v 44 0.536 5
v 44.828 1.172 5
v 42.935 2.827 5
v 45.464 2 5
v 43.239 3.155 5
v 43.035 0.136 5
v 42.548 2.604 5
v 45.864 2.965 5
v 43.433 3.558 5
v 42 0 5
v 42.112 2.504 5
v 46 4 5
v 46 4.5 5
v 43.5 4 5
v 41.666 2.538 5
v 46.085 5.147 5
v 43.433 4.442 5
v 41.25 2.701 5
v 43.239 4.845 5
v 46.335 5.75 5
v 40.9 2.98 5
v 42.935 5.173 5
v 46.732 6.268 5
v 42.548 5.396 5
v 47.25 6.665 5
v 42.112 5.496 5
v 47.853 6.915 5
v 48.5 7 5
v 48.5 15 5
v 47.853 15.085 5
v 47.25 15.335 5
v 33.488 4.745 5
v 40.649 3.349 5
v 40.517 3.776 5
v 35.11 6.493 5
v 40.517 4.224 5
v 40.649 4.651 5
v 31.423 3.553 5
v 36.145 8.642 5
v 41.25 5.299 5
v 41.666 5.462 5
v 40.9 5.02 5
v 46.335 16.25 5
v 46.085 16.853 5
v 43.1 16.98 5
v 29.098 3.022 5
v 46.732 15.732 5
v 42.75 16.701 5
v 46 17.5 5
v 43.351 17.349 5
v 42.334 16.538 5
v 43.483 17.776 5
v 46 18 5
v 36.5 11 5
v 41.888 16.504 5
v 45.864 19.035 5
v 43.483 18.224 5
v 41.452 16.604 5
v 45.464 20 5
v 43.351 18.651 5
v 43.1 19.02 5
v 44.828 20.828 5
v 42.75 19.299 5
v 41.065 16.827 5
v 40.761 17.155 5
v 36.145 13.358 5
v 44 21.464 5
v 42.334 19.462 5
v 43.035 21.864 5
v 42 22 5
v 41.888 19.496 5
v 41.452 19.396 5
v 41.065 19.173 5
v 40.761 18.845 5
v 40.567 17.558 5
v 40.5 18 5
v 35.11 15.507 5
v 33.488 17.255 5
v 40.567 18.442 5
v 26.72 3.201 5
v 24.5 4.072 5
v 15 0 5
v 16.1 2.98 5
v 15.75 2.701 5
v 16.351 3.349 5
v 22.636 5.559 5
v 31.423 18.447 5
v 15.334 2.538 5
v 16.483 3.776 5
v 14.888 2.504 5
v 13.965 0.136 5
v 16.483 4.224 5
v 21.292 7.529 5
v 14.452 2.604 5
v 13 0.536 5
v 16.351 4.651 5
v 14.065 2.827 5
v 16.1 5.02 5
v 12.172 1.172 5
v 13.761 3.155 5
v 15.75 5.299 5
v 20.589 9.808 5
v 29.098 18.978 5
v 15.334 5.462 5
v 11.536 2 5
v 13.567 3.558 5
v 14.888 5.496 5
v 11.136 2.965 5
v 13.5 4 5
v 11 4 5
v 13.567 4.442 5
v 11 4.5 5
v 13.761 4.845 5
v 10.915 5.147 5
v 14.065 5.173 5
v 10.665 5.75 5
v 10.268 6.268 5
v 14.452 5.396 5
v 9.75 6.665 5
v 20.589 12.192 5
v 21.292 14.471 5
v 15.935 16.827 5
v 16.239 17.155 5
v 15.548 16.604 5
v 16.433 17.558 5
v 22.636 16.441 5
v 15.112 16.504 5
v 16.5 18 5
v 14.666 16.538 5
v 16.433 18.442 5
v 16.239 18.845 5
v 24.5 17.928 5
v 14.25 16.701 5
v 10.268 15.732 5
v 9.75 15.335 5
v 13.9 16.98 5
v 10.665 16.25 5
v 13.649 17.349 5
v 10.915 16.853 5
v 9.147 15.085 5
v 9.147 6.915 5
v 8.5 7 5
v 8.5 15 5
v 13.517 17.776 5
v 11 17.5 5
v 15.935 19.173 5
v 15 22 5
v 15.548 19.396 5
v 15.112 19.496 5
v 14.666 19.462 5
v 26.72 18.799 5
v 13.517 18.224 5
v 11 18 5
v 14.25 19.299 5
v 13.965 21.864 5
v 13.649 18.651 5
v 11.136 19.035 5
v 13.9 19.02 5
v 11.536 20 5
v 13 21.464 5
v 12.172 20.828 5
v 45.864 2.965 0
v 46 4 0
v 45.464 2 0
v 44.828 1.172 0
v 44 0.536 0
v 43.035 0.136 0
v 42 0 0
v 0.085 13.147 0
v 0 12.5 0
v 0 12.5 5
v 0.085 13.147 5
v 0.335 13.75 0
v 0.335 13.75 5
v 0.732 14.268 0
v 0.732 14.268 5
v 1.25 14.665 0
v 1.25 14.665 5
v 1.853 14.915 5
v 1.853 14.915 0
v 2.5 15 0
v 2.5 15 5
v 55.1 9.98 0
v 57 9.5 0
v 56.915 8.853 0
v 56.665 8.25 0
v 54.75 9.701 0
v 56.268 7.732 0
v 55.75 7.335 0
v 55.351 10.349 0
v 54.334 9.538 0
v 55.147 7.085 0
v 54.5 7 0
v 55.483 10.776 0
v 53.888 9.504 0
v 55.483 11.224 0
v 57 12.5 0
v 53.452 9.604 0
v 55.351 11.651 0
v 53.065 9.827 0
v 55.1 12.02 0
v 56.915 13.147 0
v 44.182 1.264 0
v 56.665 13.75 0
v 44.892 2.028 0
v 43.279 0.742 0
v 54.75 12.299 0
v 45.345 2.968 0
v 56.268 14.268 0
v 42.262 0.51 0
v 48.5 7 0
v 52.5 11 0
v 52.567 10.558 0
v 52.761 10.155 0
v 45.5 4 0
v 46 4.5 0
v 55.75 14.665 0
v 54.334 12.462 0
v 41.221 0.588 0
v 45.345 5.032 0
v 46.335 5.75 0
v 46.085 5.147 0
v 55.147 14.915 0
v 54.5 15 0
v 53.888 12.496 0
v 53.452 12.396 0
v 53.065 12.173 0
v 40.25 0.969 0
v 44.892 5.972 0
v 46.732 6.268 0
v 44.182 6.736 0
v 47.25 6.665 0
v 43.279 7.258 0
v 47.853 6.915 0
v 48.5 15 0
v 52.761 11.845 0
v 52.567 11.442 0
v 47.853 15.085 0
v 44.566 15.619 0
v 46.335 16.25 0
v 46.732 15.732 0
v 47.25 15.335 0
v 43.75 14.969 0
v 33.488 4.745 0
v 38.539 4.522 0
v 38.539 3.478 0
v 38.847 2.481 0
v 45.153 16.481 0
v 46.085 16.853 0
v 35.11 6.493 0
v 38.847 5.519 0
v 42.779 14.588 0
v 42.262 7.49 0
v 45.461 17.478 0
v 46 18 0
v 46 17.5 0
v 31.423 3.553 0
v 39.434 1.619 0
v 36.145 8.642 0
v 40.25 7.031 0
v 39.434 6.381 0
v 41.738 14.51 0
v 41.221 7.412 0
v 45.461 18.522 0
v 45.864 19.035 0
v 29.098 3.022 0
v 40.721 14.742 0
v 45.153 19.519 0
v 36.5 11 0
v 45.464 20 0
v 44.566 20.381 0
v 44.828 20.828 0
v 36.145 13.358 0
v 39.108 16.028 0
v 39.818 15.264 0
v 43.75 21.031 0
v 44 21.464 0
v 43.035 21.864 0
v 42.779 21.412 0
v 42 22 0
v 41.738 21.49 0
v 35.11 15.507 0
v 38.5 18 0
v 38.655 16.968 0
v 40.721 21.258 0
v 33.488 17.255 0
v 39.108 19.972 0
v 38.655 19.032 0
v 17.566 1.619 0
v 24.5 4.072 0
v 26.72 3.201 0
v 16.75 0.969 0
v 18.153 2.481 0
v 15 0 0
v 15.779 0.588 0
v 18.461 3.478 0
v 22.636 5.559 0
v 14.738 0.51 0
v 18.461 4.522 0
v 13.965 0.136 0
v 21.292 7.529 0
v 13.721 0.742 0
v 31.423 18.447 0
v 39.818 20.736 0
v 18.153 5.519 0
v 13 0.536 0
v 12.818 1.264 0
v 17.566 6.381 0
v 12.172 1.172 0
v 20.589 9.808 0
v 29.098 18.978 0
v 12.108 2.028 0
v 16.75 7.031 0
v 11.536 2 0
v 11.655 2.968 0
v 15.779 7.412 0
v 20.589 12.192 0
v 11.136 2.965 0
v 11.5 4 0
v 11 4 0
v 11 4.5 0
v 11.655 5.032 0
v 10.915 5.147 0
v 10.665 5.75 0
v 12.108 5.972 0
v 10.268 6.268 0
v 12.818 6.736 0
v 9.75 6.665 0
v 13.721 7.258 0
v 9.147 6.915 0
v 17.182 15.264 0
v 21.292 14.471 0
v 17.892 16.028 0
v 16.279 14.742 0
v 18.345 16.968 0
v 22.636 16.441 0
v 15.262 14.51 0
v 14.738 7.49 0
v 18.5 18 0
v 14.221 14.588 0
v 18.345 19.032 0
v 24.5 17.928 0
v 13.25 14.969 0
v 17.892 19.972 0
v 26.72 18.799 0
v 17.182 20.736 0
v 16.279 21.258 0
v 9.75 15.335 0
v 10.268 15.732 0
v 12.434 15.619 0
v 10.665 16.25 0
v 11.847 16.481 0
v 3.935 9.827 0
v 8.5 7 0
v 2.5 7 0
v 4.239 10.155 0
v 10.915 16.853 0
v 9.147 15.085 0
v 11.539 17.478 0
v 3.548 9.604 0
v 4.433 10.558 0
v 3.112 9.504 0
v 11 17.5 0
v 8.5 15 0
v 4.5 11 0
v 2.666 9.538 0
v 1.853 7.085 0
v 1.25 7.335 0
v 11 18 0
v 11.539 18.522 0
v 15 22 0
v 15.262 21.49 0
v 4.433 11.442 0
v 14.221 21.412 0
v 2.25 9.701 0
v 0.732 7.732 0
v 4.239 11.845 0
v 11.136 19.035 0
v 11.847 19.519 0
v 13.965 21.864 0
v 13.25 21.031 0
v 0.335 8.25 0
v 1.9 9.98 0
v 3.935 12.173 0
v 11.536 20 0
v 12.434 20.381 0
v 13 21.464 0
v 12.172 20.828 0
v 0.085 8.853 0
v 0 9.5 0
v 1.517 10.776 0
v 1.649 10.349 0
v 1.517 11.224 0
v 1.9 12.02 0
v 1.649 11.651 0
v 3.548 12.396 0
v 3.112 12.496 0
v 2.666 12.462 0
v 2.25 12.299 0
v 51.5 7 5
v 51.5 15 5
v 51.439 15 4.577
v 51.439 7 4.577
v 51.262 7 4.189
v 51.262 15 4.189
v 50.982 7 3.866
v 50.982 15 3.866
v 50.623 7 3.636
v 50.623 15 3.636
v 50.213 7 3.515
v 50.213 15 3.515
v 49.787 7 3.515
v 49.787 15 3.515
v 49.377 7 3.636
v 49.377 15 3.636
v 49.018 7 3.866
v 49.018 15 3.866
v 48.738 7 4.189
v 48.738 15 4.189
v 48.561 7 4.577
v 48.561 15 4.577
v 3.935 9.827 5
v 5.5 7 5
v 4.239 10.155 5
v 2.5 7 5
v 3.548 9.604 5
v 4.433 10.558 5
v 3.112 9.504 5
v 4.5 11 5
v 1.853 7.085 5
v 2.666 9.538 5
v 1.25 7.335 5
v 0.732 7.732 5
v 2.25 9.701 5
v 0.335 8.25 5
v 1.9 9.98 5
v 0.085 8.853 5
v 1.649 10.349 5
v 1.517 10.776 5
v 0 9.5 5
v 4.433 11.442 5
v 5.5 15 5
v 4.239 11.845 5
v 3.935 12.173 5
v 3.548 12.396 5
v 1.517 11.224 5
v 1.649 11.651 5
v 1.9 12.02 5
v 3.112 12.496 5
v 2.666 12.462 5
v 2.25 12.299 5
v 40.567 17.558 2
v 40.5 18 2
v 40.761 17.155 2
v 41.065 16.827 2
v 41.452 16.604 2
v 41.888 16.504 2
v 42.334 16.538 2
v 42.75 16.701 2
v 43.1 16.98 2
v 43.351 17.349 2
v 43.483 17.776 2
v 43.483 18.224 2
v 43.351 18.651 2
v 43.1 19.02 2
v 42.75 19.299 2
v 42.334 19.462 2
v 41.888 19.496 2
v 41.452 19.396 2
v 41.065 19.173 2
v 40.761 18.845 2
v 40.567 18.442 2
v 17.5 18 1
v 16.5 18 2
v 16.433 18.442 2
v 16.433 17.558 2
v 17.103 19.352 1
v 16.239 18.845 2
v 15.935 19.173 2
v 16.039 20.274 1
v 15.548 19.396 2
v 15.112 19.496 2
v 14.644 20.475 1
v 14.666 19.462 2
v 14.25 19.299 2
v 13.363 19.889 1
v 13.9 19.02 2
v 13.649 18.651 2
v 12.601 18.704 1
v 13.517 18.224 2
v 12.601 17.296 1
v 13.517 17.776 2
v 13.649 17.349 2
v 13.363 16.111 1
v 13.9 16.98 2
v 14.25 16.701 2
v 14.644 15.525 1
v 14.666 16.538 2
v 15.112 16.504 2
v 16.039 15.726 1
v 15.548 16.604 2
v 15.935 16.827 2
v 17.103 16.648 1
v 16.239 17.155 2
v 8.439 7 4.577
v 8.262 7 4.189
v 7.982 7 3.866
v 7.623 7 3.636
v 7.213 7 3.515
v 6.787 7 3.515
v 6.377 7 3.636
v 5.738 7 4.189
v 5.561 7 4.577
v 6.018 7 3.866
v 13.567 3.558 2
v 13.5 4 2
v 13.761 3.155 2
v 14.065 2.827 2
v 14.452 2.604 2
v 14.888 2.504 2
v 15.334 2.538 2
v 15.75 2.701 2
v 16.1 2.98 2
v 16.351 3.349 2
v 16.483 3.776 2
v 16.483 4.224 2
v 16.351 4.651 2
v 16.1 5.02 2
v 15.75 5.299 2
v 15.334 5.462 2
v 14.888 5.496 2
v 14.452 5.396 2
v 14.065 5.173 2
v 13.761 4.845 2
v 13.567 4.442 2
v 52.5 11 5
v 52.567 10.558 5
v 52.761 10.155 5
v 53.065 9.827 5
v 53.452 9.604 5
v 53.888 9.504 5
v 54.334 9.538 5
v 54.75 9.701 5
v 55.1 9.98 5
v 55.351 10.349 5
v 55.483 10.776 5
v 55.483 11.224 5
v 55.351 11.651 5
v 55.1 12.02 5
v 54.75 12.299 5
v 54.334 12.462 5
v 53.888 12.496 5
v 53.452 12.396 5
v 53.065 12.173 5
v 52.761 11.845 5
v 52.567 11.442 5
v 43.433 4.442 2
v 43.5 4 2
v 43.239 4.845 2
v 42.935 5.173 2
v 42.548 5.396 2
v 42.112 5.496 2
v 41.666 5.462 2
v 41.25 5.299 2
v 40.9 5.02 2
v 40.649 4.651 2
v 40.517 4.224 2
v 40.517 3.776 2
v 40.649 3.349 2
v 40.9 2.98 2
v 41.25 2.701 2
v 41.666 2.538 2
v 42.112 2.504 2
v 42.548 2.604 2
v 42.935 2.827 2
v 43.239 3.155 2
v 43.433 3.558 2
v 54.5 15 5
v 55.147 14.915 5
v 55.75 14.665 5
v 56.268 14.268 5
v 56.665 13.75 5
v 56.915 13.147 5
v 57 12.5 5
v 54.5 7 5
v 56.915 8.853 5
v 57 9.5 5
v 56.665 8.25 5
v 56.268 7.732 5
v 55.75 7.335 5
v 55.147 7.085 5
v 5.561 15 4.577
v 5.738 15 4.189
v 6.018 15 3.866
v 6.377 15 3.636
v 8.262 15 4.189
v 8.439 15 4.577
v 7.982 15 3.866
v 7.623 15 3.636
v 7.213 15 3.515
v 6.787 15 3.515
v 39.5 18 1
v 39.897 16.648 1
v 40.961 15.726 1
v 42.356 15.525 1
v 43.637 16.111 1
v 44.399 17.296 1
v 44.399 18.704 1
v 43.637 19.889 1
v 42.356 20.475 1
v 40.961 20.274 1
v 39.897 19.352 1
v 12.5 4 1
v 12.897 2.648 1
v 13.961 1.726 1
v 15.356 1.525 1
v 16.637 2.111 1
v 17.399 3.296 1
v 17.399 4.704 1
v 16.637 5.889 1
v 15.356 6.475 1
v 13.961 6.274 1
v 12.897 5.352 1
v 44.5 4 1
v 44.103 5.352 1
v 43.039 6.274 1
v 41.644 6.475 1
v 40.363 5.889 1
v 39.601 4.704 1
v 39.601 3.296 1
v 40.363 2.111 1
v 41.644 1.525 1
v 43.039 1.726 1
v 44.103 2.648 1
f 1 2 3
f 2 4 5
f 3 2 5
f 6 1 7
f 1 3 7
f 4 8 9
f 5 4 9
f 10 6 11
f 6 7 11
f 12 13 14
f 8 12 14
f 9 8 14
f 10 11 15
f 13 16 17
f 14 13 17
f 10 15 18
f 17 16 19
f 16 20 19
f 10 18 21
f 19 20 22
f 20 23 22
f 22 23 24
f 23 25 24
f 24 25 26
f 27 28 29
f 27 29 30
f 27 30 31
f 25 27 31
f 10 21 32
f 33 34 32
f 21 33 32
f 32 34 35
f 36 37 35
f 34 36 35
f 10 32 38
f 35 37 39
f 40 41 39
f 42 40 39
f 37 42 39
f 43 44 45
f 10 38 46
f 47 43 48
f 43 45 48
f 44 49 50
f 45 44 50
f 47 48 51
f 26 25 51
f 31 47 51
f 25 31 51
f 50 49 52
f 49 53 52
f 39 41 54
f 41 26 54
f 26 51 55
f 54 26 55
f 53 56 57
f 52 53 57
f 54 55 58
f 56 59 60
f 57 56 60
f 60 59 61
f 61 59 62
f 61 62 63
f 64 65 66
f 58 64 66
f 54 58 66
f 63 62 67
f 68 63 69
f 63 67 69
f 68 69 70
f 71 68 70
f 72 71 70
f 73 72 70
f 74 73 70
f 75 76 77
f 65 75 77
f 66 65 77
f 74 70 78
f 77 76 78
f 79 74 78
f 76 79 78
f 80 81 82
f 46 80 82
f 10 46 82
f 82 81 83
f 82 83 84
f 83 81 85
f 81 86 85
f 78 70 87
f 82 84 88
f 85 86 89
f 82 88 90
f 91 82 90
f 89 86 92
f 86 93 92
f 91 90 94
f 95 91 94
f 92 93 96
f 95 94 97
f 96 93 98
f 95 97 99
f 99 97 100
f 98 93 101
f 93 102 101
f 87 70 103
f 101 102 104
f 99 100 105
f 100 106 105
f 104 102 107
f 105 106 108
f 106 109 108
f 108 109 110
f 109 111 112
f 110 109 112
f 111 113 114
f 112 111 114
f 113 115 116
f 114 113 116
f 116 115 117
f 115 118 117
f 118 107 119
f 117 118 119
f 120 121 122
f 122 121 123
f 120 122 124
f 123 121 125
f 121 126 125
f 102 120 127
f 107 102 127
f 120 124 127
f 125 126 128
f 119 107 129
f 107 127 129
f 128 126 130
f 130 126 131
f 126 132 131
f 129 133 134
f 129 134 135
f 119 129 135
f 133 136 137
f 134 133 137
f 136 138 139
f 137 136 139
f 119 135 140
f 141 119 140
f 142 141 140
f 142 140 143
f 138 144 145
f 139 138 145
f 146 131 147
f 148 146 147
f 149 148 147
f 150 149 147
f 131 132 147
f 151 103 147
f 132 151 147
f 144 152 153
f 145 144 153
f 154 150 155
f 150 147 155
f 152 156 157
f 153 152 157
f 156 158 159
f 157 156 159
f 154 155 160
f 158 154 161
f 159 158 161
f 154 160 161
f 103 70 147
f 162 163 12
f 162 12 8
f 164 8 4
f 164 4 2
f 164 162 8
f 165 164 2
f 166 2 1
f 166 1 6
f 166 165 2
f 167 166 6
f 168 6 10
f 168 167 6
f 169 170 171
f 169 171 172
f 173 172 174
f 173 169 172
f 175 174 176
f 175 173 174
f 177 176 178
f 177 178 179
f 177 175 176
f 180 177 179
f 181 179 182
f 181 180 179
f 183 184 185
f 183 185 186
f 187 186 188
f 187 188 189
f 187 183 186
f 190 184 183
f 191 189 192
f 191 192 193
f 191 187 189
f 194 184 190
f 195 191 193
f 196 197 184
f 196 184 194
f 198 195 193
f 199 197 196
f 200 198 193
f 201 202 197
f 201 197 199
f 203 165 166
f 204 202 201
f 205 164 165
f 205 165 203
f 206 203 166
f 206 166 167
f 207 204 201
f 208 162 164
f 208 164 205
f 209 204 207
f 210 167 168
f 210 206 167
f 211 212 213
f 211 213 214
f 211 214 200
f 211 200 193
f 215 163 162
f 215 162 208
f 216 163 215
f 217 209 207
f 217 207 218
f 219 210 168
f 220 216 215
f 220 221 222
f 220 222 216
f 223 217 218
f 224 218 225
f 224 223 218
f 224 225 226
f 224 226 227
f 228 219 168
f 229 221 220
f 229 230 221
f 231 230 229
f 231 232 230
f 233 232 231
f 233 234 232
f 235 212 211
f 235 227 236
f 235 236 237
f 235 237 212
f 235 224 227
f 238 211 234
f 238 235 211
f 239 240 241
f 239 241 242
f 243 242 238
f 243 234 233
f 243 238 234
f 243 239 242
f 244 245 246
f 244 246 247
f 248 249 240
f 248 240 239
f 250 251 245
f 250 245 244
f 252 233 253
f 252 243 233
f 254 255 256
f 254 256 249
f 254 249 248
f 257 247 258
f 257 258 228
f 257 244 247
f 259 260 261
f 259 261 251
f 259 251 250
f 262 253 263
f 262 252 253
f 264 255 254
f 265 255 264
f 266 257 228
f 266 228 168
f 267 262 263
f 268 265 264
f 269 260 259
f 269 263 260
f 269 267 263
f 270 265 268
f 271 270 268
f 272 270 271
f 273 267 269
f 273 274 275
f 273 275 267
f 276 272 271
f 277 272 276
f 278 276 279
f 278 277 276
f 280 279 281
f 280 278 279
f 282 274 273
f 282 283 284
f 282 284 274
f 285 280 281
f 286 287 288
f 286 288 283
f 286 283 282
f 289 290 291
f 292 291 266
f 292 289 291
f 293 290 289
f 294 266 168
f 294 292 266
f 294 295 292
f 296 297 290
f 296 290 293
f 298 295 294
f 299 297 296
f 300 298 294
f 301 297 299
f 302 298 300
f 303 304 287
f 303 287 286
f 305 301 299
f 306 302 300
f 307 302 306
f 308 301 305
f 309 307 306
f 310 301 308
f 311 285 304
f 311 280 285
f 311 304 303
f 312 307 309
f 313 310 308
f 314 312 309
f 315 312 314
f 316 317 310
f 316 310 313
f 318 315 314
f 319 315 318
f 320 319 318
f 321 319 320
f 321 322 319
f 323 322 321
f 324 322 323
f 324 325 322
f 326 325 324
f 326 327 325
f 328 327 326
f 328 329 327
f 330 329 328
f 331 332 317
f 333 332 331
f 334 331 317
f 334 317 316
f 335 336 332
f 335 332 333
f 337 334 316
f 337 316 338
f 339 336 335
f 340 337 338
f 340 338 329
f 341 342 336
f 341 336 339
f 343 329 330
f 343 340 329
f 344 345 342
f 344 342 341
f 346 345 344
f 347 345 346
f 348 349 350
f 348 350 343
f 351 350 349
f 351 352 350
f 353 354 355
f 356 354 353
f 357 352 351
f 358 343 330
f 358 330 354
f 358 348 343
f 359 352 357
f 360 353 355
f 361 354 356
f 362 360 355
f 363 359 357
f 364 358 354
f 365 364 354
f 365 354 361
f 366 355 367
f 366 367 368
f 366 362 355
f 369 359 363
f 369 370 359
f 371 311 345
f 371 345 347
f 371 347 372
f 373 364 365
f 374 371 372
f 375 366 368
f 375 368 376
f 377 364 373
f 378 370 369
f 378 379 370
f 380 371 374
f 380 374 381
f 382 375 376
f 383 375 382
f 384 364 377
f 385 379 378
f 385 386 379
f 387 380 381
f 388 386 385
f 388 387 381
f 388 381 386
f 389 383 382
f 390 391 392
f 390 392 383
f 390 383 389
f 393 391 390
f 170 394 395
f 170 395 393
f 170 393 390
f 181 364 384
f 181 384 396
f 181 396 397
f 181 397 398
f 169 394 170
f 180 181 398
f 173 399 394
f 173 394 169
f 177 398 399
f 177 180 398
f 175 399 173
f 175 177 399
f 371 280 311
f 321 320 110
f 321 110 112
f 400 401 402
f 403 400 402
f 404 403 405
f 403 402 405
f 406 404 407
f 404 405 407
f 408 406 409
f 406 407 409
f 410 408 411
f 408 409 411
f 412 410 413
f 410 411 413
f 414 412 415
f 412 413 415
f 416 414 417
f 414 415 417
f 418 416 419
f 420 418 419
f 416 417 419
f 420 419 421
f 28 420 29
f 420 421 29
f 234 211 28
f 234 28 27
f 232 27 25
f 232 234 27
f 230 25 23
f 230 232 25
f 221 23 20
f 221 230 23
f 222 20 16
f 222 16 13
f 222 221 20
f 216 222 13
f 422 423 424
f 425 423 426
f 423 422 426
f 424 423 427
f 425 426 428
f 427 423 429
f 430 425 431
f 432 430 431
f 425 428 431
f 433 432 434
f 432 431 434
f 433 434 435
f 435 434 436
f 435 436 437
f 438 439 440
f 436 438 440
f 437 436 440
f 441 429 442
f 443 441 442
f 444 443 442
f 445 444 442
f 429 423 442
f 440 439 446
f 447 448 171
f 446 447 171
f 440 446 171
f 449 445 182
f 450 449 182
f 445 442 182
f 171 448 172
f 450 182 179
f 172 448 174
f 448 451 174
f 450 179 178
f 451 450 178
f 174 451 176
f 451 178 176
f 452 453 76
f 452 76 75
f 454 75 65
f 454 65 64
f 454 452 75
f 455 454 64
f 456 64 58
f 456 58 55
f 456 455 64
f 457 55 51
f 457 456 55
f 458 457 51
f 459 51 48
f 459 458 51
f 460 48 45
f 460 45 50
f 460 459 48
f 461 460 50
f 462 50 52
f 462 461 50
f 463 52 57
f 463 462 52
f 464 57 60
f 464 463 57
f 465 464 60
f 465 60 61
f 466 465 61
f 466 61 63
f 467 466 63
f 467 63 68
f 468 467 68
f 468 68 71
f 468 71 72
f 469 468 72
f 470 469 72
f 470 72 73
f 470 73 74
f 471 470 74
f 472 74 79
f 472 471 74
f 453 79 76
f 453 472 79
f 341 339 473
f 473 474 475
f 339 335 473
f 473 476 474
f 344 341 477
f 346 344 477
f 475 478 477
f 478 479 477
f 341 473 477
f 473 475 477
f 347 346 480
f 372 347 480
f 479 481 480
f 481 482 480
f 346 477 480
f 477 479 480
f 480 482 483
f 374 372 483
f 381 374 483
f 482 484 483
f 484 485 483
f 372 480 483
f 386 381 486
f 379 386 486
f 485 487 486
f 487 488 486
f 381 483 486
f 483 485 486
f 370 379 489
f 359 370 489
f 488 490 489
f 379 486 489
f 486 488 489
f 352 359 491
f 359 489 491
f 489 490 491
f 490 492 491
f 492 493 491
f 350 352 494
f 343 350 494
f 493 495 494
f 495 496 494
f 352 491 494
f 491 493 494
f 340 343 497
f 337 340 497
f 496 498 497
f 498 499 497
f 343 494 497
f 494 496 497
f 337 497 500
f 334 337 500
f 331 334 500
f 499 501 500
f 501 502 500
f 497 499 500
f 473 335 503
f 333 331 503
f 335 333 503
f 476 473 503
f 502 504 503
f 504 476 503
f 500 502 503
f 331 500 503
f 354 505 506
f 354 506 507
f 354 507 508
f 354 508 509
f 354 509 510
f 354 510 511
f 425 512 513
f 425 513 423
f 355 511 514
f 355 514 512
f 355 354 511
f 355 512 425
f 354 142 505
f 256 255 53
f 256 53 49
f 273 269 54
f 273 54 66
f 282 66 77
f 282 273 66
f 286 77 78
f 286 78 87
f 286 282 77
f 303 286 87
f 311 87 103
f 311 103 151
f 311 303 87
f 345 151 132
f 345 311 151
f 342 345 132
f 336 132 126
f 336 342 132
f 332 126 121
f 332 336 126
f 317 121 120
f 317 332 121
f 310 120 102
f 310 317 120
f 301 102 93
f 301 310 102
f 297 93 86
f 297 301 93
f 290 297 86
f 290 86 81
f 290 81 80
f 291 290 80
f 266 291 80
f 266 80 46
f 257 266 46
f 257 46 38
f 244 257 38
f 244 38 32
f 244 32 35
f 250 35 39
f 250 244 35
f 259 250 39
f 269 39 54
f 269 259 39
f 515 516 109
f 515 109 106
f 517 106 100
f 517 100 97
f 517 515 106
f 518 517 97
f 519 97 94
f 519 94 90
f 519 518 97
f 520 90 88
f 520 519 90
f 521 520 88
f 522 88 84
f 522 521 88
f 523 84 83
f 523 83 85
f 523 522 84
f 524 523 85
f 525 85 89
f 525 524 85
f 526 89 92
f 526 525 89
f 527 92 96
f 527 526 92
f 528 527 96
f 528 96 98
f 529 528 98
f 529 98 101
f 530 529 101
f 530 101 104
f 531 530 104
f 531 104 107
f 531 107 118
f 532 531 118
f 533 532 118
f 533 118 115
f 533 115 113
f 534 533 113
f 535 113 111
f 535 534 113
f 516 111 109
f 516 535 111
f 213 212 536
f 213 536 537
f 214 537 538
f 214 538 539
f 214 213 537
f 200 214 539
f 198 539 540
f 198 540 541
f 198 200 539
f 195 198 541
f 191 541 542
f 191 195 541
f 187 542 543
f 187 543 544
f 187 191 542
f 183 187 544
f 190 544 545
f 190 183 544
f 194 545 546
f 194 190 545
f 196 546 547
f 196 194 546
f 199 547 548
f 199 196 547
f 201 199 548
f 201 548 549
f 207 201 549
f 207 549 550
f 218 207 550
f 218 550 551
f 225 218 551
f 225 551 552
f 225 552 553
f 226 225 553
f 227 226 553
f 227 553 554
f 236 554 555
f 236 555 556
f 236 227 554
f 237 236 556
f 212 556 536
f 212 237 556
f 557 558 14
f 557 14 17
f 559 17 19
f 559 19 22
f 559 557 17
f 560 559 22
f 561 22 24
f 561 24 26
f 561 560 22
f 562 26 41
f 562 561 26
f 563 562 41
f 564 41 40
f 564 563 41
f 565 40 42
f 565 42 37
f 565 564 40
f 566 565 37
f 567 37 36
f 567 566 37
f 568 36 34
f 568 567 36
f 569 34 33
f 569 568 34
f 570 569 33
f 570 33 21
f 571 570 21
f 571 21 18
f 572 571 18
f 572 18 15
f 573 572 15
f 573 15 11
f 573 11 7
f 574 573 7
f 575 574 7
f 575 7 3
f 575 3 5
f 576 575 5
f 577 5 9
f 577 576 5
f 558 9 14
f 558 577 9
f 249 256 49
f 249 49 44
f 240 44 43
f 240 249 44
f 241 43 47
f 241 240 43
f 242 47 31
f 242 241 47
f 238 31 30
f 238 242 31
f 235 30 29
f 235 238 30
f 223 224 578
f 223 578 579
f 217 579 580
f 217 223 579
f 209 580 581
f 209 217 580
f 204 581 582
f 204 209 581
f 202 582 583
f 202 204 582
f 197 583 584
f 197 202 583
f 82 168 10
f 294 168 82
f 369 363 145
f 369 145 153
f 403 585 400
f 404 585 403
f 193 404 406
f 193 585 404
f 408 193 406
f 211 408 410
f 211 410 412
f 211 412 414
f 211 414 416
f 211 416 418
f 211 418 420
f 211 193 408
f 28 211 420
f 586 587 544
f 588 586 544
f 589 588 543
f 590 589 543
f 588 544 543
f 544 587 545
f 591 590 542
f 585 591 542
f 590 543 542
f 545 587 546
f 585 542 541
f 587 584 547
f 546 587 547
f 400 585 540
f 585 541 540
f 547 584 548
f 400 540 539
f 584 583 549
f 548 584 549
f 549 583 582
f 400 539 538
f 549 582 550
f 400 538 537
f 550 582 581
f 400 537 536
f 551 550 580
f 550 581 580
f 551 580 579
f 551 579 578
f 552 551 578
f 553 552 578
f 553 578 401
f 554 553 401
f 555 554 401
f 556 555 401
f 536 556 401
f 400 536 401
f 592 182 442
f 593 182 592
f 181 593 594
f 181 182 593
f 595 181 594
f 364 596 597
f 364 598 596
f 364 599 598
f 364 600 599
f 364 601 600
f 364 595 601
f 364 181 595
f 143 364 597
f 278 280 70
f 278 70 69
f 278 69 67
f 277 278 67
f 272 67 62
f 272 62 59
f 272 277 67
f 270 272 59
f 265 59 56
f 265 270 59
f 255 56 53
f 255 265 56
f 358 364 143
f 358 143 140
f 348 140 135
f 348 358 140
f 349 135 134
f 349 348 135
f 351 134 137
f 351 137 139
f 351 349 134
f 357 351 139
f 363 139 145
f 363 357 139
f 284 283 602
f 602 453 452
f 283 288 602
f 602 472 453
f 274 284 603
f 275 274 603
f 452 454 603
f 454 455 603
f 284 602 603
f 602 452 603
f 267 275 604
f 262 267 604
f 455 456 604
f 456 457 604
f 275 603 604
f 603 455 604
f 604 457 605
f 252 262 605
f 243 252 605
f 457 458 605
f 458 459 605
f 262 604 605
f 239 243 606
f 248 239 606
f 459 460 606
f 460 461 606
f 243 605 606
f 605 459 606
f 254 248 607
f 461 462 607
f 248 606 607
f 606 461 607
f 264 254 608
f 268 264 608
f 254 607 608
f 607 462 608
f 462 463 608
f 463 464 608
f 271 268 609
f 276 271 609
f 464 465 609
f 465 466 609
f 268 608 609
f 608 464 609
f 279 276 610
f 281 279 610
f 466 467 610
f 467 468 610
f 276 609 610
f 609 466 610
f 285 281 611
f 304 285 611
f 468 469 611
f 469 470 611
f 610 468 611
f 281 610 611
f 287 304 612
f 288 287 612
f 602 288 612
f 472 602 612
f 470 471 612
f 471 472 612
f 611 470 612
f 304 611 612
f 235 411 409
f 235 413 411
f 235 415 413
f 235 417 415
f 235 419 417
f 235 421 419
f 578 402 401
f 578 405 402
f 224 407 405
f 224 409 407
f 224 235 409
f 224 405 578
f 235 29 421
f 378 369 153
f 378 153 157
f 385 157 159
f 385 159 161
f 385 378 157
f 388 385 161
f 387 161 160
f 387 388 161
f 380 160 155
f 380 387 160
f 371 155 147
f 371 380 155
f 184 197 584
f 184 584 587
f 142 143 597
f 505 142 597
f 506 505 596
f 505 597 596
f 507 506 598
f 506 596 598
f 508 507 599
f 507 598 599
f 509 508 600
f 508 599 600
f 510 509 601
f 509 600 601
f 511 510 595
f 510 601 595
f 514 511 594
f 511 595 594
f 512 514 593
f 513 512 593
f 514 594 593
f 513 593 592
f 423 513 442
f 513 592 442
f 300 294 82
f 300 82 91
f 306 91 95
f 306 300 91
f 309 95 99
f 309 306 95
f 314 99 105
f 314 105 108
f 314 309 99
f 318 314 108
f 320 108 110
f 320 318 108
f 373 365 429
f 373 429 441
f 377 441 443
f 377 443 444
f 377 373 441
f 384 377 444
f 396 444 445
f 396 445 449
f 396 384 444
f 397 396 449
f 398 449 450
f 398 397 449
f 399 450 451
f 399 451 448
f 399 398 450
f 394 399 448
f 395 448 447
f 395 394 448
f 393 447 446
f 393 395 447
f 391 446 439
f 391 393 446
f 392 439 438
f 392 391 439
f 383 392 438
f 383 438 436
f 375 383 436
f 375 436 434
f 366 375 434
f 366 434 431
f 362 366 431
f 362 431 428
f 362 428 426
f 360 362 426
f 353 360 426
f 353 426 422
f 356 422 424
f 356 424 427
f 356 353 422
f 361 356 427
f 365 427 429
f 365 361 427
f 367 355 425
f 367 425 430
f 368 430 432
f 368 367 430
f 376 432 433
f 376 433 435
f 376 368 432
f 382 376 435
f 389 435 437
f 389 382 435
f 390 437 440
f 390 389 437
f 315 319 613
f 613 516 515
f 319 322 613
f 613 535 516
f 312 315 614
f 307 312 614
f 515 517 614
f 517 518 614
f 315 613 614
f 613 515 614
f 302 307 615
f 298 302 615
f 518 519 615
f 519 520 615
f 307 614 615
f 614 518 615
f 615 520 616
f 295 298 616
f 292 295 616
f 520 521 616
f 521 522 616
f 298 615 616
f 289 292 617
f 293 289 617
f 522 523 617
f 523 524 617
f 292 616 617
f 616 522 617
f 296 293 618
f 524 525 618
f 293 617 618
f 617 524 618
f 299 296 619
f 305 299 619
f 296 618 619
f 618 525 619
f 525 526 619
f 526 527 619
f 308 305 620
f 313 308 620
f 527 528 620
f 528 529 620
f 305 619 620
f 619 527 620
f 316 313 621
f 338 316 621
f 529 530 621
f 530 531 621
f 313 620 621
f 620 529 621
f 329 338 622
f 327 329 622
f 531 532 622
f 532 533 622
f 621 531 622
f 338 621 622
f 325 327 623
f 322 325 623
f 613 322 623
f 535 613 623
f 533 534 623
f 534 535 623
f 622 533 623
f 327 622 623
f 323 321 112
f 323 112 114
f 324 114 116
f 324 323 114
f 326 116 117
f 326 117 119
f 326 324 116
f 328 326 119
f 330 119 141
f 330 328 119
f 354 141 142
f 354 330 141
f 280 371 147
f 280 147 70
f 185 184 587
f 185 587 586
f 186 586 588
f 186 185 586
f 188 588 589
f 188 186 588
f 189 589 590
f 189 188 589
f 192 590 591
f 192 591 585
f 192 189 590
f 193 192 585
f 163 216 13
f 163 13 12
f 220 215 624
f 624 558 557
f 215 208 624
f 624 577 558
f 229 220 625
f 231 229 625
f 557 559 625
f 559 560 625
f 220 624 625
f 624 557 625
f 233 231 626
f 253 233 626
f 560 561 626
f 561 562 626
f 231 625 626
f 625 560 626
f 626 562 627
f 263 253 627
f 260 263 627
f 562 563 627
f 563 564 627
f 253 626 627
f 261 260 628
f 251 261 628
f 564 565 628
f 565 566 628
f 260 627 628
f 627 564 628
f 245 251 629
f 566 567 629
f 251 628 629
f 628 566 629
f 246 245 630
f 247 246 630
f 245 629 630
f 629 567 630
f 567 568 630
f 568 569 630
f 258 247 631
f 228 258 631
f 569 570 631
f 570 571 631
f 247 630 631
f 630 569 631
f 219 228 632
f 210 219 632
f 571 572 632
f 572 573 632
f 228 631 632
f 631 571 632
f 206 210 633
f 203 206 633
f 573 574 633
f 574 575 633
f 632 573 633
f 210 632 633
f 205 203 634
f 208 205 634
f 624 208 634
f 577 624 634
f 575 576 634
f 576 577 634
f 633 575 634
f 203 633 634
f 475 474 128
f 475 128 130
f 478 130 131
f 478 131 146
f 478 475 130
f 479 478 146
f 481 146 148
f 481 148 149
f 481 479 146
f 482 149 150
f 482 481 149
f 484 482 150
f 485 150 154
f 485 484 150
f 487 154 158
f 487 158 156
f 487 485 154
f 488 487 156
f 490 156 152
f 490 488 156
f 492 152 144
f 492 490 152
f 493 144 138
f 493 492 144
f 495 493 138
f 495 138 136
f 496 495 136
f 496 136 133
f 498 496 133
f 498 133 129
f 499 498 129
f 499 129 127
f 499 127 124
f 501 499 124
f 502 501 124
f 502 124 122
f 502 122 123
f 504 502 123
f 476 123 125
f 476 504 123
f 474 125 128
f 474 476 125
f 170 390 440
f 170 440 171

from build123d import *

# Parameters (mm, degrees)
SKETCH_1_R          = 8
SKETCH_1_R_2        = 1.5
EXTRUDE_1_DEPTH     = 5
SKETCH_2_R          = 1.5
CUT_EXTRUDE_1_DEPTH = 11.5
CHAMFER_1_SIZE      = 2


with BuildPart() as part:
    # 草图1 → 凸台-拉伸1 (new body)
    with BuildSketch(Plane.XY):
        with BuildLine():
            Line((2.5, 15), (8.5, 15))
            ThreePointArc((8.5, 15), (10.267766953, 15.732233047), (11, 17.5))
            Line((11, 17.5), (11, 18))
            ThreePointArc((11, 18), (12.171572875, 20.828427125), (15, 22))
            Line((15, 22), (42, 22))
            ThreePointArc((42, 22), (44.828427125, 20.828427125), (46, 18))
            Line((46, 18), (46, 17.5))
            ThreePointArc((46, 17.5), (46.732233047, 15.732233047), (48.5, 15))
            Line((48.5, 15), (54.5, 15))
            ThreePointArc((54.5, 15), (56.267766953, 14.267766953), (57, 12.5))
            Line((57, 12.5), (57, 9.5))
            ThreePointArc((57, 9.5), (56.267766953, 7.732233047), (54.5, 7))
            Line((54.5, 7), (48.5, 7))
            ThreePointArc((48.5, 7), (46.732233047, 6.267766953), (46, 4.5))
            Line((46, 4.5), (46, 4))
            ThreePointArc((46, 4), (44.828427125, 1.171572875), (42, 0))
            Line((42, 0), (15, 0))
            ThreePointArc((15, 0), (12.171572875, 1.171572875), (11, 4))
            Line((11, 4), (11, 4.5))
            ThreePointArc((11, 4.5), (10.267766953, 6.267766953), (8.5, 7))
            Line((8.5, 7), (2.5, 7))
            ThreePointArc((2.5, 7), (0.732233047, 7.732233047), (0, 9.5))
            Line((0, 9.5), (0, 12.5))
            ThreePointArc((0, 12.5), (0.732233047, 14.267766953), (2.5, 15))
        make_face()
        with Locations((28.5, 11)):
            Circle(SKETCH_1_R, mode=Mode.SUBTRACT)
        with Locations((15, 18)):
            Circle(SKETCH_1_R_2, mode=Mode.SUBTRACT)
        with Locations(Location((15, 4, 0), (0, 0, 180))):
            Circle(SKETCH_1_R_2, mode=Mode.SUBTRACT)
        with Locations(Location((42, 18, 0), (0, 0, 180))):
            Circle(SKETCH_1_R_2, mode=Mode.SUBTRACT)
        with Locations((42, 4)):
            Circle(SKETCH_1_R_2, mode=Mode.SUBTRACT)
        with Locations((3, 11)):
            Circle(SKETCH_1_R_2, mode=Mode.SUBTRACT)
        with Locations(Location((54, 11, 0), (0, 0, 180))):
            Circle(SKETCH_1_R_2, mode=Mode.SUBTRACT)
    extrude(amount=EXTRUDE_1_DEPTH)

    # 草图2 → 切除-拉伸1 (cut)
    with BuildSketch(Plane(origin=(0, 15, 0), x_dir=(1, 0, 0), z_dir=(0, 1, 0))):
        with Locations((7, -5)):
            Circle(SKETCH_2_R)
        with Locations((50, -5)):
            Circle(SKETCH_2_R)
    extrude(amount=-CUT_EXTRUDE_1_DEPTH, mode=Mode.SUBTRACT)

    # 倒角1
    chamfer_1_edges = [part.edges().sort_by_distance(p)[0] for p in [
        (13.5, 18, 0),
        (16.5, 4, 0),
        (43.5, 18, 0),
        (40.5, 4, 0),
    ]]
    chamfer(chamfer_1_edges, length=CHAMFER_1_SIZE)


solid = part.part
